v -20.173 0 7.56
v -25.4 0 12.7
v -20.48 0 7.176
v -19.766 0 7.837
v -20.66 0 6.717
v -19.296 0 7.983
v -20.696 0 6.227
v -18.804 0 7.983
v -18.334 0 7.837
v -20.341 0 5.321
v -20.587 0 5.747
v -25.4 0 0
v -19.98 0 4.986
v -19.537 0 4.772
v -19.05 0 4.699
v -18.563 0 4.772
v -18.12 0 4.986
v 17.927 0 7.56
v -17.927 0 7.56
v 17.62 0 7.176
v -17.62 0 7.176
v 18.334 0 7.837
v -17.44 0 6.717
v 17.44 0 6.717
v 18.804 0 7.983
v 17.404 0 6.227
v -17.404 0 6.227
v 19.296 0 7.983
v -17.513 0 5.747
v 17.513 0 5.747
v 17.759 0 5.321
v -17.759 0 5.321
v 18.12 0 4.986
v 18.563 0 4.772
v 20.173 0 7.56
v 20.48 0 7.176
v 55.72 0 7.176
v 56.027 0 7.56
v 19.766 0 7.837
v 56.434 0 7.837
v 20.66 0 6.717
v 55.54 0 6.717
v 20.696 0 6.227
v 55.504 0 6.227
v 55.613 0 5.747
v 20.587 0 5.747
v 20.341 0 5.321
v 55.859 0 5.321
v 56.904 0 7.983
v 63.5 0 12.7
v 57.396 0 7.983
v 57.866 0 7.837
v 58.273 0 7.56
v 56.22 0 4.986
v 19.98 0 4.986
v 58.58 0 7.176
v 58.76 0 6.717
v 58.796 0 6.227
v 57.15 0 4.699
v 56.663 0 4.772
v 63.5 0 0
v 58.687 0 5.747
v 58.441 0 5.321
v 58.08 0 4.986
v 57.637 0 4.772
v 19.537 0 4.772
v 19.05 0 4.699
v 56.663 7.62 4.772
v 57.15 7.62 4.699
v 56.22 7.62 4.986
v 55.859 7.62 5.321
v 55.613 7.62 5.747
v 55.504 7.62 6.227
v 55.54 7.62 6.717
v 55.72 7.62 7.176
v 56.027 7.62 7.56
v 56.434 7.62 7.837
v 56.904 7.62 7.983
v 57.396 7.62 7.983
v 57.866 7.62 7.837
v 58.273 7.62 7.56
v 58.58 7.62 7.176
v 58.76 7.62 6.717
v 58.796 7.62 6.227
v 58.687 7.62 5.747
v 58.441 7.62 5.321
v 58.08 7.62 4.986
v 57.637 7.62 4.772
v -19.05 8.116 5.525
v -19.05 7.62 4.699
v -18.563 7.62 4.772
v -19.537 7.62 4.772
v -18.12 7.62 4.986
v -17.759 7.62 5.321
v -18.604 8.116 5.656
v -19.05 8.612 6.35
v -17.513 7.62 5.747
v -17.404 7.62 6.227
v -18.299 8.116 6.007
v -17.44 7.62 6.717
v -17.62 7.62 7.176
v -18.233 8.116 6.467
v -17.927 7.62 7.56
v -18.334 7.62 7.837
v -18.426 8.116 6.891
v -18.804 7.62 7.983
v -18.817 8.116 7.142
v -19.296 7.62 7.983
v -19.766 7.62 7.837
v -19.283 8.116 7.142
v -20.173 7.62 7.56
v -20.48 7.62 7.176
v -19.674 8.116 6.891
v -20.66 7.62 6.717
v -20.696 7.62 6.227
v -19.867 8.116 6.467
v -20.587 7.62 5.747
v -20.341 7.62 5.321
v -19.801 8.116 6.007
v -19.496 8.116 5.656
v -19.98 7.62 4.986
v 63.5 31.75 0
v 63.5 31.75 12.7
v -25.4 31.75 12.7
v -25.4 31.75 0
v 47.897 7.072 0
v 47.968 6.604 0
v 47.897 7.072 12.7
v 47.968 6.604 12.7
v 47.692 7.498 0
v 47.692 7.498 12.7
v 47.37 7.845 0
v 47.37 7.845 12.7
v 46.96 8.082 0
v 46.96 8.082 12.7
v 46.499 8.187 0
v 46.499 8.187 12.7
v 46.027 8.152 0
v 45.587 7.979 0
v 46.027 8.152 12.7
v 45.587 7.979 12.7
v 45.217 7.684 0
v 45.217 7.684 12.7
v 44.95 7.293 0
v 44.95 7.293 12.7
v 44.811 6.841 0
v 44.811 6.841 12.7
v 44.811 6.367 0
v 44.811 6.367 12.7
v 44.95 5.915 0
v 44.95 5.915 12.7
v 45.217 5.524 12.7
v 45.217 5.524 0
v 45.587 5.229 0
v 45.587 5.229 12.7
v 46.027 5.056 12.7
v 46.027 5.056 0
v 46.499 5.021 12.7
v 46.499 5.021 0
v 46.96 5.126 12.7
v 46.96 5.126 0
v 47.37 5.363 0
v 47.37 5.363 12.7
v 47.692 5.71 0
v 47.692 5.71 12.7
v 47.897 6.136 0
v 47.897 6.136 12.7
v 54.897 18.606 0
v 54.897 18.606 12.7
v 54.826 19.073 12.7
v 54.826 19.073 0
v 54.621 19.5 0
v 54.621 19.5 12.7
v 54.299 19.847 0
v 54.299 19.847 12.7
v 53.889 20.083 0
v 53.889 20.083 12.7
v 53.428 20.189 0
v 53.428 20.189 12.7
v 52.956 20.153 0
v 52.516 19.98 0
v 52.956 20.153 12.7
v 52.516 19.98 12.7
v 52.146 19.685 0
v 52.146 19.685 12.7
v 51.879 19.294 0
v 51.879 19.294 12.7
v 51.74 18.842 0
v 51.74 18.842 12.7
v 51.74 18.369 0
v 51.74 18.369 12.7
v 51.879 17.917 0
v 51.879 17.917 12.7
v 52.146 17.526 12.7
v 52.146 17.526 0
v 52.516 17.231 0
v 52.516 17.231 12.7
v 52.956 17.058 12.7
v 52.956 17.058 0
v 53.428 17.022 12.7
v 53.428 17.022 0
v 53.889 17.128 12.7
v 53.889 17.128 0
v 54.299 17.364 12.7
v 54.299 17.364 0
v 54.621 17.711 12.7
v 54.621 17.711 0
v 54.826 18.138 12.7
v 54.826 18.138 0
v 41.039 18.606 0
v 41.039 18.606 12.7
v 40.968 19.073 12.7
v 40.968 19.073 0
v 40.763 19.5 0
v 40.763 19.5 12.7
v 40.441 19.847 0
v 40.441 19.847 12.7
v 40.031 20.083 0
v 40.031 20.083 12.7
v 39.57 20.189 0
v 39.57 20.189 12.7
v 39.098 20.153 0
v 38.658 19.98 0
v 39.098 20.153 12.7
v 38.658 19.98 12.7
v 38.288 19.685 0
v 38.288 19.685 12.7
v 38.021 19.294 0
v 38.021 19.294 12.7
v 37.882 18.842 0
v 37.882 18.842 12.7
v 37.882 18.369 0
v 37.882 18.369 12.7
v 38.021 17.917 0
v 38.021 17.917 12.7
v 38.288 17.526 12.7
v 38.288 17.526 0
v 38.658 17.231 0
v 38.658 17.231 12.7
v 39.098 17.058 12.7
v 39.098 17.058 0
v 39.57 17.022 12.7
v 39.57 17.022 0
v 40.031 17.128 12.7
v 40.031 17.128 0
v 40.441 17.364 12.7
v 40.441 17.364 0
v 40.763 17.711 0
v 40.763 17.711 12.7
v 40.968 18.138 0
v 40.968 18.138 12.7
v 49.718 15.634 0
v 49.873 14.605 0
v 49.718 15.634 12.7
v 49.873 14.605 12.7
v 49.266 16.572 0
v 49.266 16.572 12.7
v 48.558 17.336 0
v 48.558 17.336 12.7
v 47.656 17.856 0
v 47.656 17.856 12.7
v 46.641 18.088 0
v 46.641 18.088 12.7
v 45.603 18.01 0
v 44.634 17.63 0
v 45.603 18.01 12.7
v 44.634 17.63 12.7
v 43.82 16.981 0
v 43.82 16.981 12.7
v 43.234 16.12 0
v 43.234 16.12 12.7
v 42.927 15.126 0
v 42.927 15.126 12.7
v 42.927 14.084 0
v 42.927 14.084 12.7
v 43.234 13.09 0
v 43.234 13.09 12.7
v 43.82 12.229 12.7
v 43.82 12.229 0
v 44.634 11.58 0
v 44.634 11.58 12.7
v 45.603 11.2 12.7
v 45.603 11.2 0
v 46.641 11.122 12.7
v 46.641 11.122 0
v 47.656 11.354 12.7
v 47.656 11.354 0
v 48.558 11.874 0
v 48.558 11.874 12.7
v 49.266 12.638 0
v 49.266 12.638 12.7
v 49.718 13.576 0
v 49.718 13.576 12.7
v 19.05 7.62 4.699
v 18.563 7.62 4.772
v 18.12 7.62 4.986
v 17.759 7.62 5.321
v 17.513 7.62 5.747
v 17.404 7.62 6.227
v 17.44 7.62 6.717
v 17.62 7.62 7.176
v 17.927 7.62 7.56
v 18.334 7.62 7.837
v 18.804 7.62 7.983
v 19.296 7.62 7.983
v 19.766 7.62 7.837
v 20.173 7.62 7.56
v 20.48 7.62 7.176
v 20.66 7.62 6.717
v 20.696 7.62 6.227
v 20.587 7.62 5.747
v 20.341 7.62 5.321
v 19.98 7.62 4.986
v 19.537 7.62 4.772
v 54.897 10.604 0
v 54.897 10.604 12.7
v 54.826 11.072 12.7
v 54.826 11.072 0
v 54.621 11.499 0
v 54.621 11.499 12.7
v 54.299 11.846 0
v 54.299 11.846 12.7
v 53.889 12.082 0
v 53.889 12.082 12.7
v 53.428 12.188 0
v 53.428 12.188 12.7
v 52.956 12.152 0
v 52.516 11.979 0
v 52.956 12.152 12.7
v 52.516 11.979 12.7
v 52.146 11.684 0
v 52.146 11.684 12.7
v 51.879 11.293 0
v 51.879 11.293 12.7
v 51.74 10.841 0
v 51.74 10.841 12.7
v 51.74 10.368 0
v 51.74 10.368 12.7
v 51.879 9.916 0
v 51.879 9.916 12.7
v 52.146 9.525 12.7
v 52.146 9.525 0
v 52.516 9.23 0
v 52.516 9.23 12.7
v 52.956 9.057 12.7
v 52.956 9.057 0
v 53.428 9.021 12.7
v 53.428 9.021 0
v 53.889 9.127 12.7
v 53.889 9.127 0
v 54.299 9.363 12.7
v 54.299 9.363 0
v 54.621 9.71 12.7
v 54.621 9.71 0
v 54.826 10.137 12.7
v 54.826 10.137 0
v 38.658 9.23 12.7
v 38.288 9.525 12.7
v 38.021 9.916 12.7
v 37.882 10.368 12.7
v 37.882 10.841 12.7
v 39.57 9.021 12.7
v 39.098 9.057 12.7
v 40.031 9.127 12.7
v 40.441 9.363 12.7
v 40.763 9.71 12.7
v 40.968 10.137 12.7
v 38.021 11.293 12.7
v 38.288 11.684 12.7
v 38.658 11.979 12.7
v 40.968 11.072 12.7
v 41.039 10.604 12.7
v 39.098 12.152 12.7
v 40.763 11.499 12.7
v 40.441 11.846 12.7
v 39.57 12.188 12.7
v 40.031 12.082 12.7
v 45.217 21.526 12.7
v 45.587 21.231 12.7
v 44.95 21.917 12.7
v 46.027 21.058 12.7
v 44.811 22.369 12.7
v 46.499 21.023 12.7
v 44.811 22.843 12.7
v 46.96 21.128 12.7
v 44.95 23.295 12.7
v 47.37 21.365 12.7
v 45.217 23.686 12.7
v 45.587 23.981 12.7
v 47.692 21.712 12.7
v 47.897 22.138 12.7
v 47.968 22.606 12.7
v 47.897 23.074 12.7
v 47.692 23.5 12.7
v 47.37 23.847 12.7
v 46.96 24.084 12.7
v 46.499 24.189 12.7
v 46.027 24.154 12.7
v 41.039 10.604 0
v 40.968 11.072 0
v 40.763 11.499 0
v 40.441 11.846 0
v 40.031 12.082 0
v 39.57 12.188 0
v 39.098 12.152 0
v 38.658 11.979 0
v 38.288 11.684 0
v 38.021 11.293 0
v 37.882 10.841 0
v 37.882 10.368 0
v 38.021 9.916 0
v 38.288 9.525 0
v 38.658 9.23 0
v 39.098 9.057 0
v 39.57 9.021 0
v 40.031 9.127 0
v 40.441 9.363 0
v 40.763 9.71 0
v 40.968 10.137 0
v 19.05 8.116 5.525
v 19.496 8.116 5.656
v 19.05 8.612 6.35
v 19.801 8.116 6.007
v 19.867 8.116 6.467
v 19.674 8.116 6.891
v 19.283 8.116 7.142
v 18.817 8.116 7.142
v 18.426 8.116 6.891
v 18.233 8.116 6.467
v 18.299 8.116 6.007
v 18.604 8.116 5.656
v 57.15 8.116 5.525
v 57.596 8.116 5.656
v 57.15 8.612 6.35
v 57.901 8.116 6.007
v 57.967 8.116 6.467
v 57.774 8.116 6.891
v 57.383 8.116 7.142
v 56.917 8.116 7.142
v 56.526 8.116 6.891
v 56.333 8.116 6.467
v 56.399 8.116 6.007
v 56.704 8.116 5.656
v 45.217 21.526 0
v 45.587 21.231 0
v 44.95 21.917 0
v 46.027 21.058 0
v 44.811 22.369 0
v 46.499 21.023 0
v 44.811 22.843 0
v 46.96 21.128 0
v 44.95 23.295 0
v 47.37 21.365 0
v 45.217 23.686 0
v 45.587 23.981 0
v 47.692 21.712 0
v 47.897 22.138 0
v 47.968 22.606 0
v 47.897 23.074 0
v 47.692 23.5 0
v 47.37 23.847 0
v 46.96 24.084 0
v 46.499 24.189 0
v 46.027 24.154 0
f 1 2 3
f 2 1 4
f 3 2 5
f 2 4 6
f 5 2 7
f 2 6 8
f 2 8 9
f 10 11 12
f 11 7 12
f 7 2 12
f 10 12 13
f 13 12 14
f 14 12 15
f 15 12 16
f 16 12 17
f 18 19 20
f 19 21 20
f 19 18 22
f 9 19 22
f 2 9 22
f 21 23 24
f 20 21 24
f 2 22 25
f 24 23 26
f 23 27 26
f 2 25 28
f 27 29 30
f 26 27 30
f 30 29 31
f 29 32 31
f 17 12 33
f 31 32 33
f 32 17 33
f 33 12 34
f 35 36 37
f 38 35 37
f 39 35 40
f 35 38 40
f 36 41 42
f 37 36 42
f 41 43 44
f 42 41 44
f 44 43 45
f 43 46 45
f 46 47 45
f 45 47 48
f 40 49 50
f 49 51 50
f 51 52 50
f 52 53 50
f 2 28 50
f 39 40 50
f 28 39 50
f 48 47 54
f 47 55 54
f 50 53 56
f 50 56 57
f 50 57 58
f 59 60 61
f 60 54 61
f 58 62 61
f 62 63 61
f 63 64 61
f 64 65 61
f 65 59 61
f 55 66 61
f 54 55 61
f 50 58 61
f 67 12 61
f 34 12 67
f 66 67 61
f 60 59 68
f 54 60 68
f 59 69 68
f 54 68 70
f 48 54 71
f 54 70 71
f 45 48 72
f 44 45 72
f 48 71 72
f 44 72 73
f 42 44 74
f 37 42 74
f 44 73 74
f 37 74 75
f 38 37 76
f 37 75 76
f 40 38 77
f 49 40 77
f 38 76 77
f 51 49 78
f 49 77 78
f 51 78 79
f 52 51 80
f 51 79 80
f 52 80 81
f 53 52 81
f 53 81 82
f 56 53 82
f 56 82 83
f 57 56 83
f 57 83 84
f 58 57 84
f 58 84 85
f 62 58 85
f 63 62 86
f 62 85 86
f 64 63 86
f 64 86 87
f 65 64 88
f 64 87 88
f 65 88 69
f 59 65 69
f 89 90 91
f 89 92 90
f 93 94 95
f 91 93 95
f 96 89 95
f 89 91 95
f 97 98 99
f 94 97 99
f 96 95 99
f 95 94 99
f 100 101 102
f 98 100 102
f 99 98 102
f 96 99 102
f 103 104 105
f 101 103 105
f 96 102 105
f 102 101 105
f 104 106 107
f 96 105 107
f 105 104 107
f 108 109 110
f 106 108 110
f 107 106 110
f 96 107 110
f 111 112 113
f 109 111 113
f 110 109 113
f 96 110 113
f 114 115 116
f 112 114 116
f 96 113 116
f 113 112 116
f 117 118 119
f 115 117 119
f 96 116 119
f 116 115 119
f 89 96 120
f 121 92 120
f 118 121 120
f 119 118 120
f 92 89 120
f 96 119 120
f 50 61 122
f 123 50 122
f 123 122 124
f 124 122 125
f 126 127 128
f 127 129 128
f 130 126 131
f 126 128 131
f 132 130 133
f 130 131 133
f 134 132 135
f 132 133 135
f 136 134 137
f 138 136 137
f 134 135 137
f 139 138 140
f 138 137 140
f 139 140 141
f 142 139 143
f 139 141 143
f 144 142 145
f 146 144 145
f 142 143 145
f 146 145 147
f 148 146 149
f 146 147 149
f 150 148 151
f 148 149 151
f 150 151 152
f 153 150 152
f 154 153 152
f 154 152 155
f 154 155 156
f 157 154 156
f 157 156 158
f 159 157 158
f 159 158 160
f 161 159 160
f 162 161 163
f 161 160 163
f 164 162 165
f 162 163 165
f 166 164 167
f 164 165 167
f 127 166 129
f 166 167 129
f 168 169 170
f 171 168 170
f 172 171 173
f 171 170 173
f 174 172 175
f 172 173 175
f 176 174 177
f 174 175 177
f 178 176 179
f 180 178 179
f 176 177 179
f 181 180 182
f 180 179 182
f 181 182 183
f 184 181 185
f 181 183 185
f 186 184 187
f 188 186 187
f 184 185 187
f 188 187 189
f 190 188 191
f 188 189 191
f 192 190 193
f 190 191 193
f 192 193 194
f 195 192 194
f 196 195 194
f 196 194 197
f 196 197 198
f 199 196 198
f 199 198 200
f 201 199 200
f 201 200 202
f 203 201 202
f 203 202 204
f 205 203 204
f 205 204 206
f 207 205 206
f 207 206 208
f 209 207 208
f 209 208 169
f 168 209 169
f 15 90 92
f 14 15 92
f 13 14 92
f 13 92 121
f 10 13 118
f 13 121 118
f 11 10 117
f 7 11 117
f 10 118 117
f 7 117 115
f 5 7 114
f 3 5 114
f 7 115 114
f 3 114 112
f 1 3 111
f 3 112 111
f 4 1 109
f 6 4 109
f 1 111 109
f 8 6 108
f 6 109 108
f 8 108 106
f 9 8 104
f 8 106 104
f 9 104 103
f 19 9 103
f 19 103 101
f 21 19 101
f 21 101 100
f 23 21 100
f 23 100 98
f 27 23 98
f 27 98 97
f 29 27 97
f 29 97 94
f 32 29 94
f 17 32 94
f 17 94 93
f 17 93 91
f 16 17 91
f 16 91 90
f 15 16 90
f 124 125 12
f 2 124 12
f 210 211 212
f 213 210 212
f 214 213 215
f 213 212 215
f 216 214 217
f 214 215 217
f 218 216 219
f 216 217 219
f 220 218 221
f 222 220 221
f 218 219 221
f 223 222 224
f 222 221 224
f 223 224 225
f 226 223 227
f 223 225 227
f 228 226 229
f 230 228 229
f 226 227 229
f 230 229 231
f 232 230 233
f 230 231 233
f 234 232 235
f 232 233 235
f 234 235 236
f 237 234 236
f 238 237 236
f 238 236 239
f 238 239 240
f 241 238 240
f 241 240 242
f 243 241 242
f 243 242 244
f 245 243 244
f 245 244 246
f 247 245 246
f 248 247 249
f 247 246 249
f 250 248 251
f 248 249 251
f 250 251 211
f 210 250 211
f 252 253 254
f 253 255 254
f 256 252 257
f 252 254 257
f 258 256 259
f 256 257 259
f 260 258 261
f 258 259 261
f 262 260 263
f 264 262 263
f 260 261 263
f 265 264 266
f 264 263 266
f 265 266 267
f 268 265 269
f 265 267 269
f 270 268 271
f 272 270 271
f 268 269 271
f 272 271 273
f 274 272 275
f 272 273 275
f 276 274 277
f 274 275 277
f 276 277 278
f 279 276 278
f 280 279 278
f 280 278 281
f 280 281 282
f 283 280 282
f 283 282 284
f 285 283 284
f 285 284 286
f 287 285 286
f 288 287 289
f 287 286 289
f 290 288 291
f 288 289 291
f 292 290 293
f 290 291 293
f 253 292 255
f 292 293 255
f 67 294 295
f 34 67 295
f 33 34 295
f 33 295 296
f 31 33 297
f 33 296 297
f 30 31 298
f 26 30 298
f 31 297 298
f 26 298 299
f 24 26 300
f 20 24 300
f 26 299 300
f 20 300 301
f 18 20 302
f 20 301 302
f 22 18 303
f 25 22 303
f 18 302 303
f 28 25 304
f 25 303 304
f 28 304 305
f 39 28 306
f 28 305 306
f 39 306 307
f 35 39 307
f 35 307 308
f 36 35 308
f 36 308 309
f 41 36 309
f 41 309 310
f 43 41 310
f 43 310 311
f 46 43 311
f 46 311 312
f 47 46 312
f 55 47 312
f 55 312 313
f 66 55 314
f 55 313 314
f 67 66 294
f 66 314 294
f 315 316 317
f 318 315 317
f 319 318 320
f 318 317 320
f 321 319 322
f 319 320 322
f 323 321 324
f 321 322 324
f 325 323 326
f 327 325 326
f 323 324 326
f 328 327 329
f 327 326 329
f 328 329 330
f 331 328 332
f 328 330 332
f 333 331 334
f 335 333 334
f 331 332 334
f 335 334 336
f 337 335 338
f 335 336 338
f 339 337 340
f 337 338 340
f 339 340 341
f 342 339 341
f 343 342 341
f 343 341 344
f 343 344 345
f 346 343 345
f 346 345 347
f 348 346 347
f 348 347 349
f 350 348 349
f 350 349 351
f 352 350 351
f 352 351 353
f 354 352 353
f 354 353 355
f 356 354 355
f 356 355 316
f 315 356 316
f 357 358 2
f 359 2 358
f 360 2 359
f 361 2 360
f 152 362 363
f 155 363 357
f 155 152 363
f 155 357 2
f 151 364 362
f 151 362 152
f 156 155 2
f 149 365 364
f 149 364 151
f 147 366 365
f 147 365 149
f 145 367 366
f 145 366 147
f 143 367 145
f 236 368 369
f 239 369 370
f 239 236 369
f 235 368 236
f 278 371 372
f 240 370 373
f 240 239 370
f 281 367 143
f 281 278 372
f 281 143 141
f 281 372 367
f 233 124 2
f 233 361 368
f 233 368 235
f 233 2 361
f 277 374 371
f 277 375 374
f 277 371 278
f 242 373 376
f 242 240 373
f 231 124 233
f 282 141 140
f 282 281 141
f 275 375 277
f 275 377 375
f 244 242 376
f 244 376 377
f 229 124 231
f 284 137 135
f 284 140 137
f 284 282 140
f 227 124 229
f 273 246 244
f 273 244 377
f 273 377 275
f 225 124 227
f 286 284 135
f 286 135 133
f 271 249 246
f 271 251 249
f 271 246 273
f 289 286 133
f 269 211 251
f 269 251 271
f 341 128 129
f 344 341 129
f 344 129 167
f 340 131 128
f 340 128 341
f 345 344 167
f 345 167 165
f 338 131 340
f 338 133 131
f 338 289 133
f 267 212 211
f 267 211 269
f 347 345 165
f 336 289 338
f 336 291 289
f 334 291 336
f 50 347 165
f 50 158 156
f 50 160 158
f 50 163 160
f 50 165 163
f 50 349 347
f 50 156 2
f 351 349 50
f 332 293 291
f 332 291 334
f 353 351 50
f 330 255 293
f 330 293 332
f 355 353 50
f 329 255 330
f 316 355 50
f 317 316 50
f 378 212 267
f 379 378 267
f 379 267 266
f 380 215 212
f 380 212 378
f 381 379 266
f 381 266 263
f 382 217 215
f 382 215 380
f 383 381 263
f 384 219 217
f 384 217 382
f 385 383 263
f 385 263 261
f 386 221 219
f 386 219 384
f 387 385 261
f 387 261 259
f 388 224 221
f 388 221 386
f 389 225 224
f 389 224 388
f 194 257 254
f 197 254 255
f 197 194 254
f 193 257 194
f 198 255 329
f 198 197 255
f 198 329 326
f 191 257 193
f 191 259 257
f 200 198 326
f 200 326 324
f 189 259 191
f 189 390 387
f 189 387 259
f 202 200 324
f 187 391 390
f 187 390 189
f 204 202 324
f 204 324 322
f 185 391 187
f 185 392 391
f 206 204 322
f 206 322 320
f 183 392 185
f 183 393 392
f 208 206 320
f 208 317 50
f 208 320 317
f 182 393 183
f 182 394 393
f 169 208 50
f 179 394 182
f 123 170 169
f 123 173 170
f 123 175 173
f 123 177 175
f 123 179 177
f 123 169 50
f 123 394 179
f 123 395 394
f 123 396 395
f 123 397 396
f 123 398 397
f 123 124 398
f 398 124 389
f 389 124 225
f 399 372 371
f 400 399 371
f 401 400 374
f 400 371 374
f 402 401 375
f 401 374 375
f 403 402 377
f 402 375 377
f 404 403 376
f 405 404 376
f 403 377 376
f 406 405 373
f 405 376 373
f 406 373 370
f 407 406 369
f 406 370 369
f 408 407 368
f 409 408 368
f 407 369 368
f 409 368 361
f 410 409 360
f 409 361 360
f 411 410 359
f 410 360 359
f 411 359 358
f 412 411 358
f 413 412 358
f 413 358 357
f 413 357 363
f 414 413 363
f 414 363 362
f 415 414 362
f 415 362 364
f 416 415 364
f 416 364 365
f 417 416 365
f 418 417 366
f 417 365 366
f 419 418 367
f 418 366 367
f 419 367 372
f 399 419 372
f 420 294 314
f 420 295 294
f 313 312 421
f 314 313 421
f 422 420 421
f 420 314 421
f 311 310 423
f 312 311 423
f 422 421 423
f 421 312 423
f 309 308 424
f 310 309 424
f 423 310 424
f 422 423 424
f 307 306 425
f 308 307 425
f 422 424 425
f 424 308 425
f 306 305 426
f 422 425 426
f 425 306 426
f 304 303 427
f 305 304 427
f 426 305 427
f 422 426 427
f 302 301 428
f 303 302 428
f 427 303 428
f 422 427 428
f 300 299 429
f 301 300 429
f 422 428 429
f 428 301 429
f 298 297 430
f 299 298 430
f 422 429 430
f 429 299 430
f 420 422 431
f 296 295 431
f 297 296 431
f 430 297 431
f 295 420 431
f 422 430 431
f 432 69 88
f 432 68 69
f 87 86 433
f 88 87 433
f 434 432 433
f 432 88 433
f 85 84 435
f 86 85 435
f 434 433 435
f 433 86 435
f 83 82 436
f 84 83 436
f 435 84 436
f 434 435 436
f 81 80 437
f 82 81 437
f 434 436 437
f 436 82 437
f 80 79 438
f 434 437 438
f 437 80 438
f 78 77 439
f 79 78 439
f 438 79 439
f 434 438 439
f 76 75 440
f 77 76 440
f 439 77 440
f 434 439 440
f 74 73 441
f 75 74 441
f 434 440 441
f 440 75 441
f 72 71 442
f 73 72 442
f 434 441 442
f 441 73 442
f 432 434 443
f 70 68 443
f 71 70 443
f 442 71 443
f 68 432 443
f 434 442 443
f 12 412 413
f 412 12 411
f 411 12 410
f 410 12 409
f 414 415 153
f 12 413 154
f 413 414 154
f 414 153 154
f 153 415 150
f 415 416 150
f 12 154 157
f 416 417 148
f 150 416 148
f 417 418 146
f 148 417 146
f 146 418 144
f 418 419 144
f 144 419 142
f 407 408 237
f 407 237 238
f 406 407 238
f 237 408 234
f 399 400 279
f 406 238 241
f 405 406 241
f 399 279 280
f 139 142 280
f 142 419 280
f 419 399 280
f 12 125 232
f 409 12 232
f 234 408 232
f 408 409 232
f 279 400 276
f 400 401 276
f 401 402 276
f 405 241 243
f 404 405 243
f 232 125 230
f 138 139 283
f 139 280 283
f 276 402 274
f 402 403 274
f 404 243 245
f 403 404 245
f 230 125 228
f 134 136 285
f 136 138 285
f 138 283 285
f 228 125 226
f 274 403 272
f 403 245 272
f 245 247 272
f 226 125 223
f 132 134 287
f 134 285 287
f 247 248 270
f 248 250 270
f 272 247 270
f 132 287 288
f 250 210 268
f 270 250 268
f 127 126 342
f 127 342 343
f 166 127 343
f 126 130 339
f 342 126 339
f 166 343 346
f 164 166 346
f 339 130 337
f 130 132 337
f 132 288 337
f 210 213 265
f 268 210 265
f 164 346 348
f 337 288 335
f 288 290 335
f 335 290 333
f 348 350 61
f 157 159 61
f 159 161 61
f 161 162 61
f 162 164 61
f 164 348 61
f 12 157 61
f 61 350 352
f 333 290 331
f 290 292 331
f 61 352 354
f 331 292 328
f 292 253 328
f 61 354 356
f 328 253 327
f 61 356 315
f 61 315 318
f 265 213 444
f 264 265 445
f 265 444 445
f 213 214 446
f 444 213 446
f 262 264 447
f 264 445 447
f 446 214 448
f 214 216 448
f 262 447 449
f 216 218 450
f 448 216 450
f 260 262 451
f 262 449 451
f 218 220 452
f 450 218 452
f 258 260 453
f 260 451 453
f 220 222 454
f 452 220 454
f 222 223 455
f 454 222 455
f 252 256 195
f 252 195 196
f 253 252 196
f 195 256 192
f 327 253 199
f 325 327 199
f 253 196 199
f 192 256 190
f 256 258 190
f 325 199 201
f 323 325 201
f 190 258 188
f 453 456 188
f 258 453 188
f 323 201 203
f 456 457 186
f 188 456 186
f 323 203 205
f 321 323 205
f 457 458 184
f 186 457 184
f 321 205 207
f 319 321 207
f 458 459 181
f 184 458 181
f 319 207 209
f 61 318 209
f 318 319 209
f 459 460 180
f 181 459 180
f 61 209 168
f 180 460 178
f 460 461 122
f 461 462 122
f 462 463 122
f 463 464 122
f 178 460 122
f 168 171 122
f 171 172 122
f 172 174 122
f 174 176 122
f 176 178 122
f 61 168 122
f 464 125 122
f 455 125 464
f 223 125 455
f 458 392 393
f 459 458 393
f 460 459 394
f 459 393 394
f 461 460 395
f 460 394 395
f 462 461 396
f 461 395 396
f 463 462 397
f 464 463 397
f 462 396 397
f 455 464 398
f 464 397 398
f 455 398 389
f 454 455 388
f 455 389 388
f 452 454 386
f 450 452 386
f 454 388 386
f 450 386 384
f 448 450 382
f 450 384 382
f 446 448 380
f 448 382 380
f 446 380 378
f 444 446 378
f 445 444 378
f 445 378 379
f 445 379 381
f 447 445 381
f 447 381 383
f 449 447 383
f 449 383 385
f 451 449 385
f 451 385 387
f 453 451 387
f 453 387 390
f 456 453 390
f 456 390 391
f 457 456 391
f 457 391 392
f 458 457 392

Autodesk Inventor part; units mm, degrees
ref_plane "YZ Plane" through (0, 0, 0) normal (1, 0, 0) x (0, 1, 0)
ref_plane "XZ Plane" through (0, 0, 0) normal (0, 1, 0) x (-1, 0, 0)
ref_plane "XY Plane" through (0, 0, 0) normal (0, 0, 1) x (1, 0, 0)
sketch "Sketch1" plane through (0, 0, 0) normal (0, 0, 1) x (1, 0, 0)
  line L0 (0, 0) -> (63.5, 0)
  line L1 (63.5, 0) -> (63.5, 31.75)
  line L2 (63.5, 31.75) -> (0, 31.75)
  line L3 (0, 31.75) -> (0, 0)
  dimension "d0" = 63.5
  dimension "d1" = 31.75
extrude "Extrusion1" add sketch "Sketch1" along normal blind 12.7
sketch "Sketch2" plane through (0, 0, 12.7) normal (0, 0, 1) x (1, 0, 0)
  line L0 (63.5, 0) -> (63.5, 31.75) projected
  line L1 (63.5, 12.7901) -> (80.6196, 12.7901) construction
  line L2 (0, 0) -> (63.5, 0) projected
  line L3 (46.3804, 0) -> (46.3804, 14.605)
  line L4 (46.3804, 0) -> (60.9854, 0) construction
  circle A0 centre (46.3804, 14.605) radius 3.4925
  circle A1 centre (46.3804, 14.605) radius 8.001
  circle A2 centre (46.3804, 6.604) radius 1.5875
  circle A3 centre (53.3095, 10.6045) radius 1.5875
  circle A4 centre (46.3804, 14.605) radius 8.001
  circle A5 centre (53.3095, 18.6055) radius 1.5875
  circle A6 centre (46.3804, 14.605) radius 8.001
  circle A7 centre (46.3804, 22.606) radius 1.5875
  circle A8 centre (46.3804, 14.605) radius 8.001
  circle A9 centre (39.4513, 18.6055) radius 1.5875
  circle A10 centre (46.3804, 14.605) radius 8.001
  circle A11 centre (39.4513, 10.6045) radius 1.5875
  circle A12 centre (46.3804, 14.605) radius 8.001
  dimension "d9" = 16.002
  dimension "d6" = 14.605
  dimension "d7" = 90
  dimension "d8" = 6.985
  dimension "d10" = 3.175
  dimension "d13" = 360
  dimension "d17" = 17.1196
extrude "Extrusion2" cut sketch "Sketch2" against normal blind 19.05 contours A2 A1 L3 | L3 A1 A2 | A1 A2 L3 | L3 A2 A1 | A11 A1 | A1 A11 | A3 A1 | A1 A3 | A9 A1 | A1 A9 | A5 A1 | A1 A5 | A7 A1 | A1 A7 | A0
thicken "Thicken1" operation add thickness 25.4 both sides no extend neighbours yes toward (-1, 0, 0) faces at (0, 21.1667, 4.2333)
sketch "Sketch4" plane through (63.5, 0, 0) normal (0, -1, 0) x (1, 0, 0)
  line L0 (-88.9, 0) -> (-88.9, 12.7) projected
  line L1 (0, 0) -> (0, 12.7) projected
  point P0 (-63.5, 0)
  point P1 (-82.55, 6.35)
  point P2 (-44.45, 6.35)
  point P3 (-6.35, 6.35)
  dimension "d42" = 6.35
  dimension "d43" = 88.9
  dimension "d44" = 44.45
  dimension "d45" = 6.35
hole "Hole1" at (-19.05, 0, 6.35) at (19.05, 0, 6.35) at (57.15, 0, 6.35) direction (0, 1, 0) diameter 3.302 depth 7.62 tip angle 118 thread size "8-32 UNC" class "2B" standard "ANSI Unified Screw Threads"
equation "\"d44\" = 0.5 * d43"
properties part number "MotorHolderB"
